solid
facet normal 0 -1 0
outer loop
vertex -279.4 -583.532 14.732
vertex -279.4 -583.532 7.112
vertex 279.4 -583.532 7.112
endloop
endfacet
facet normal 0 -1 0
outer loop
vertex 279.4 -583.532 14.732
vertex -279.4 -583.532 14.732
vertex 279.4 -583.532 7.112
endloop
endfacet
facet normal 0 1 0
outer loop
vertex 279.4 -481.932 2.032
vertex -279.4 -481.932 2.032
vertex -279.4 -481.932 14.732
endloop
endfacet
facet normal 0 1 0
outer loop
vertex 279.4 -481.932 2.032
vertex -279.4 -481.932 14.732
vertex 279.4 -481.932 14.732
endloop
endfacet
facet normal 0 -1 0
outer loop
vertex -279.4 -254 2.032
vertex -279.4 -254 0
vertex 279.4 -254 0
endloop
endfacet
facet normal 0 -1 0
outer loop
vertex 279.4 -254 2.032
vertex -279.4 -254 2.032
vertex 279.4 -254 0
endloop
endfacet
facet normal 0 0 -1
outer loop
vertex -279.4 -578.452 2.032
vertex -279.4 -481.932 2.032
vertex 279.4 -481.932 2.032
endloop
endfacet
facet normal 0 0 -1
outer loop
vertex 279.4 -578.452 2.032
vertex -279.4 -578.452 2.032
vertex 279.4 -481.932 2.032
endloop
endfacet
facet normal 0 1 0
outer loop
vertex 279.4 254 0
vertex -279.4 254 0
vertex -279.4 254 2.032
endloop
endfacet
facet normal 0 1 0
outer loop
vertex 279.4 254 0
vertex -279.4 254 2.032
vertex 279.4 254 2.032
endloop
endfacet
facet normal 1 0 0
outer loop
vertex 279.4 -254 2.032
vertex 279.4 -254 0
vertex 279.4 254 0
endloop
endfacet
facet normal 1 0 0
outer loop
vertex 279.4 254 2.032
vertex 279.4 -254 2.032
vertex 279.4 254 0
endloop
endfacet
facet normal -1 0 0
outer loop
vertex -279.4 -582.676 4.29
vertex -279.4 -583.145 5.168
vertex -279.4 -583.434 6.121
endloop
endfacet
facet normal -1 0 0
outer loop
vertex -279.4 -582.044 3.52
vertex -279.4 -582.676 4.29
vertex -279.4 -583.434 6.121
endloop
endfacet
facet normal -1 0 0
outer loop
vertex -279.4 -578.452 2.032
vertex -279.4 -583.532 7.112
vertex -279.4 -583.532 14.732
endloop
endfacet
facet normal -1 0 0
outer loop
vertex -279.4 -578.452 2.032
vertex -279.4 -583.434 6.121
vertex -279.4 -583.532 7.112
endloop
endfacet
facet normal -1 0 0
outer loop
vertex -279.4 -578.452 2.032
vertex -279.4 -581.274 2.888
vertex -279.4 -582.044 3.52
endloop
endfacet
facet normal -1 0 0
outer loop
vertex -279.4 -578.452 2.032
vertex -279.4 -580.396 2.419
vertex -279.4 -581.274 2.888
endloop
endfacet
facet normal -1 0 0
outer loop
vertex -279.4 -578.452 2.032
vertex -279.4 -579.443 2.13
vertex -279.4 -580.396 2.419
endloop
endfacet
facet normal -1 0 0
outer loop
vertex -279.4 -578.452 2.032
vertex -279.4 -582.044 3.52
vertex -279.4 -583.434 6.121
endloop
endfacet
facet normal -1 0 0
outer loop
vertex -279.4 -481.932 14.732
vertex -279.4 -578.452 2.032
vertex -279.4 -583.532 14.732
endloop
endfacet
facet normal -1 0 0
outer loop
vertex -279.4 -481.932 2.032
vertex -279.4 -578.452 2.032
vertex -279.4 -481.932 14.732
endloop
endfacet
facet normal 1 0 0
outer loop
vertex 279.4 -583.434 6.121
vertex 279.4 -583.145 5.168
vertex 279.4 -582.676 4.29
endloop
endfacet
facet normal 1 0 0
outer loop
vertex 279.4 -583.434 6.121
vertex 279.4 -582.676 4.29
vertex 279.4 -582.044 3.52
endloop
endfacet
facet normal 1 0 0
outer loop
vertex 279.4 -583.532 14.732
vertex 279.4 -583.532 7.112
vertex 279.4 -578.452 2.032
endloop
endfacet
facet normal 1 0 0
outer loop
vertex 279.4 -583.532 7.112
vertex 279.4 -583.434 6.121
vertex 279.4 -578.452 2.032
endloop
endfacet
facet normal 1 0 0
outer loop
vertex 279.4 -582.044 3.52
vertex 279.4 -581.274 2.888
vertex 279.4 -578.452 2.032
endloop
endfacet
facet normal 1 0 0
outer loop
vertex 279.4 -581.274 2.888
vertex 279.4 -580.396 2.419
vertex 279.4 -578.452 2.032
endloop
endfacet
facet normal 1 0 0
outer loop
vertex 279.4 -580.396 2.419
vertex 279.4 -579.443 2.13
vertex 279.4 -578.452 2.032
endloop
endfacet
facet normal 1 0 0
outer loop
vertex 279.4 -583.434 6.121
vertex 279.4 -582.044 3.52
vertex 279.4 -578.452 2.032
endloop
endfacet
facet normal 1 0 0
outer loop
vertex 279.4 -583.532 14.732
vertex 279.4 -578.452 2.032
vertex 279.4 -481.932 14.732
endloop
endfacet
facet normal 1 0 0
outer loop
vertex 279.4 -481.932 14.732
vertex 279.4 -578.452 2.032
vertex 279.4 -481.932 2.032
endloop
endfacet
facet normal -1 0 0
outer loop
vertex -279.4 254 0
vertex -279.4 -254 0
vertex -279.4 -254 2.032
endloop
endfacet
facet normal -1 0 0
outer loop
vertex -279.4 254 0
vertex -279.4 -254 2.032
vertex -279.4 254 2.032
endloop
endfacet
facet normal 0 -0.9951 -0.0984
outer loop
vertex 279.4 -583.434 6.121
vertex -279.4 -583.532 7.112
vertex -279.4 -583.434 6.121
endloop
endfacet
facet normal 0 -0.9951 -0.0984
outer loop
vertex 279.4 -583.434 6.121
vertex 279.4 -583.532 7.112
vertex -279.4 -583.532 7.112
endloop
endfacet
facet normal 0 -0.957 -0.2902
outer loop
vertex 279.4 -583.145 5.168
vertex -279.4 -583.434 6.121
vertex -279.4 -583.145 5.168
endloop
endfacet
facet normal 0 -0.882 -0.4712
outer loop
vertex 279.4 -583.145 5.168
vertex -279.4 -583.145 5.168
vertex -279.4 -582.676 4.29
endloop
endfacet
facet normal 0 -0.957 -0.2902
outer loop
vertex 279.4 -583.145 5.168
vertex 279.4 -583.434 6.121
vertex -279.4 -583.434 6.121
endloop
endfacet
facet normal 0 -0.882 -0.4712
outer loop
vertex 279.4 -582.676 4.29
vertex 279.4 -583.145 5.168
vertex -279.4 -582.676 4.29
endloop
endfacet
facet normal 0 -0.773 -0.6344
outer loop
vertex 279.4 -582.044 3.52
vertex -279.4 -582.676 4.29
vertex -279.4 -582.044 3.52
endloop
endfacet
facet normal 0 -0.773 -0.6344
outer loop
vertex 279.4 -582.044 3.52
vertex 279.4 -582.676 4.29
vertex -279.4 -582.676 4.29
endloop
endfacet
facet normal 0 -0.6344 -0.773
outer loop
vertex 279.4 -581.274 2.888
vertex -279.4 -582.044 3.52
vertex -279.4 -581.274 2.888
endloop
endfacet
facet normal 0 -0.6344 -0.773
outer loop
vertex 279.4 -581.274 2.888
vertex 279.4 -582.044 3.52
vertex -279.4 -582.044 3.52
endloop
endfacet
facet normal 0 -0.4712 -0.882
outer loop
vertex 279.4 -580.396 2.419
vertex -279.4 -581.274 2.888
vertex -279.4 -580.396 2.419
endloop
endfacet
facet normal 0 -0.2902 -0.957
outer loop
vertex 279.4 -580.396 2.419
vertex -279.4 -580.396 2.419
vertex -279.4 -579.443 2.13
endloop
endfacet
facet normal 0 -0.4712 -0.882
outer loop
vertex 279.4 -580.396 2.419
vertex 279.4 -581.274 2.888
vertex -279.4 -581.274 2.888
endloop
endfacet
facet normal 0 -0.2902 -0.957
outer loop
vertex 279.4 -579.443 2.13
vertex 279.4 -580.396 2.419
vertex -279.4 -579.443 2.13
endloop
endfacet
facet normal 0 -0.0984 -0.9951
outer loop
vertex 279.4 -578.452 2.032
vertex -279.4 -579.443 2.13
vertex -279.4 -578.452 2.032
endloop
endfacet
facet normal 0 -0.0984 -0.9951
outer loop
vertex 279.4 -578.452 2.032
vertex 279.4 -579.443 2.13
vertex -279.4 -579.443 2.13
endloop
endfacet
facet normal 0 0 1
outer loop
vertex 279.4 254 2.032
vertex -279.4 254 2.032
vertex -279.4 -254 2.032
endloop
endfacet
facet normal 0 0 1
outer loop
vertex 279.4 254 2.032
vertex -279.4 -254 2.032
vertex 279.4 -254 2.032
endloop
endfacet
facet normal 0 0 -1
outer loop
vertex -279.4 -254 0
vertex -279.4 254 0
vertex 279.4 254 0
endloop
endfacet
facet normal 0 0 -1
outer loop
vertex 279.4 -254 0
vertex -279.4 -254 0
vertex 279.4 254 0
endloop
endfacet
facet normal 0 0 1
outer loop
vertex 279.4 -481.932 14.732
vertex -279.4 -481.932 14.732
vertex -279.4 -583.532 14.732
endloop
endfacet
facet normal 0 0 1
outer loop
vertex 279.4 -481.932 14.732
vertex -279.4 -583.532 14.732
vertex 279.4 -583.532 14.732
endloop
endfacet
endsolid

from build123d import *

# Parameters (mm, degrees)
F0_W     = 558.8
F0_H     = 508
F1_DEPTH = 2.032
F2_W     = 558.8
F2_H     = 101.6
F3_DEPTH = 12.7
F4_R     = 5.08


# Not quite as in the source:
# - a length typed as a fraction of an inch, garbled in the dataset ("3 / 203.2 mm" for 3/8 in), is restored


with BuildPart() as f1:
    # F0 (on Top) → F1 (new body)
    with BuildSketch(Plane.XY):
        Rectangle(F0_W, F0_H)
    extrude(amount=F1_DEPTH)


with BuildPart() as f3:
    # F2 (on face) → F3 (new body)
    with BuildSketch(Plane.XY.offset(2.032)):
        with Locations((0, -532.7320098877)):
            Rectangle(F2_W, F2_H)
    extrude(amount=F3_DEPTH)

    # F4
    f4_edges = [f3.edges().sort_by_distance(p)[0] for p in [
        (0, -583.53201, 2.032),
    ]]
    fillet(f4_edges, radius=F4_R)


solid = Compound([f1.part, f3.part])
